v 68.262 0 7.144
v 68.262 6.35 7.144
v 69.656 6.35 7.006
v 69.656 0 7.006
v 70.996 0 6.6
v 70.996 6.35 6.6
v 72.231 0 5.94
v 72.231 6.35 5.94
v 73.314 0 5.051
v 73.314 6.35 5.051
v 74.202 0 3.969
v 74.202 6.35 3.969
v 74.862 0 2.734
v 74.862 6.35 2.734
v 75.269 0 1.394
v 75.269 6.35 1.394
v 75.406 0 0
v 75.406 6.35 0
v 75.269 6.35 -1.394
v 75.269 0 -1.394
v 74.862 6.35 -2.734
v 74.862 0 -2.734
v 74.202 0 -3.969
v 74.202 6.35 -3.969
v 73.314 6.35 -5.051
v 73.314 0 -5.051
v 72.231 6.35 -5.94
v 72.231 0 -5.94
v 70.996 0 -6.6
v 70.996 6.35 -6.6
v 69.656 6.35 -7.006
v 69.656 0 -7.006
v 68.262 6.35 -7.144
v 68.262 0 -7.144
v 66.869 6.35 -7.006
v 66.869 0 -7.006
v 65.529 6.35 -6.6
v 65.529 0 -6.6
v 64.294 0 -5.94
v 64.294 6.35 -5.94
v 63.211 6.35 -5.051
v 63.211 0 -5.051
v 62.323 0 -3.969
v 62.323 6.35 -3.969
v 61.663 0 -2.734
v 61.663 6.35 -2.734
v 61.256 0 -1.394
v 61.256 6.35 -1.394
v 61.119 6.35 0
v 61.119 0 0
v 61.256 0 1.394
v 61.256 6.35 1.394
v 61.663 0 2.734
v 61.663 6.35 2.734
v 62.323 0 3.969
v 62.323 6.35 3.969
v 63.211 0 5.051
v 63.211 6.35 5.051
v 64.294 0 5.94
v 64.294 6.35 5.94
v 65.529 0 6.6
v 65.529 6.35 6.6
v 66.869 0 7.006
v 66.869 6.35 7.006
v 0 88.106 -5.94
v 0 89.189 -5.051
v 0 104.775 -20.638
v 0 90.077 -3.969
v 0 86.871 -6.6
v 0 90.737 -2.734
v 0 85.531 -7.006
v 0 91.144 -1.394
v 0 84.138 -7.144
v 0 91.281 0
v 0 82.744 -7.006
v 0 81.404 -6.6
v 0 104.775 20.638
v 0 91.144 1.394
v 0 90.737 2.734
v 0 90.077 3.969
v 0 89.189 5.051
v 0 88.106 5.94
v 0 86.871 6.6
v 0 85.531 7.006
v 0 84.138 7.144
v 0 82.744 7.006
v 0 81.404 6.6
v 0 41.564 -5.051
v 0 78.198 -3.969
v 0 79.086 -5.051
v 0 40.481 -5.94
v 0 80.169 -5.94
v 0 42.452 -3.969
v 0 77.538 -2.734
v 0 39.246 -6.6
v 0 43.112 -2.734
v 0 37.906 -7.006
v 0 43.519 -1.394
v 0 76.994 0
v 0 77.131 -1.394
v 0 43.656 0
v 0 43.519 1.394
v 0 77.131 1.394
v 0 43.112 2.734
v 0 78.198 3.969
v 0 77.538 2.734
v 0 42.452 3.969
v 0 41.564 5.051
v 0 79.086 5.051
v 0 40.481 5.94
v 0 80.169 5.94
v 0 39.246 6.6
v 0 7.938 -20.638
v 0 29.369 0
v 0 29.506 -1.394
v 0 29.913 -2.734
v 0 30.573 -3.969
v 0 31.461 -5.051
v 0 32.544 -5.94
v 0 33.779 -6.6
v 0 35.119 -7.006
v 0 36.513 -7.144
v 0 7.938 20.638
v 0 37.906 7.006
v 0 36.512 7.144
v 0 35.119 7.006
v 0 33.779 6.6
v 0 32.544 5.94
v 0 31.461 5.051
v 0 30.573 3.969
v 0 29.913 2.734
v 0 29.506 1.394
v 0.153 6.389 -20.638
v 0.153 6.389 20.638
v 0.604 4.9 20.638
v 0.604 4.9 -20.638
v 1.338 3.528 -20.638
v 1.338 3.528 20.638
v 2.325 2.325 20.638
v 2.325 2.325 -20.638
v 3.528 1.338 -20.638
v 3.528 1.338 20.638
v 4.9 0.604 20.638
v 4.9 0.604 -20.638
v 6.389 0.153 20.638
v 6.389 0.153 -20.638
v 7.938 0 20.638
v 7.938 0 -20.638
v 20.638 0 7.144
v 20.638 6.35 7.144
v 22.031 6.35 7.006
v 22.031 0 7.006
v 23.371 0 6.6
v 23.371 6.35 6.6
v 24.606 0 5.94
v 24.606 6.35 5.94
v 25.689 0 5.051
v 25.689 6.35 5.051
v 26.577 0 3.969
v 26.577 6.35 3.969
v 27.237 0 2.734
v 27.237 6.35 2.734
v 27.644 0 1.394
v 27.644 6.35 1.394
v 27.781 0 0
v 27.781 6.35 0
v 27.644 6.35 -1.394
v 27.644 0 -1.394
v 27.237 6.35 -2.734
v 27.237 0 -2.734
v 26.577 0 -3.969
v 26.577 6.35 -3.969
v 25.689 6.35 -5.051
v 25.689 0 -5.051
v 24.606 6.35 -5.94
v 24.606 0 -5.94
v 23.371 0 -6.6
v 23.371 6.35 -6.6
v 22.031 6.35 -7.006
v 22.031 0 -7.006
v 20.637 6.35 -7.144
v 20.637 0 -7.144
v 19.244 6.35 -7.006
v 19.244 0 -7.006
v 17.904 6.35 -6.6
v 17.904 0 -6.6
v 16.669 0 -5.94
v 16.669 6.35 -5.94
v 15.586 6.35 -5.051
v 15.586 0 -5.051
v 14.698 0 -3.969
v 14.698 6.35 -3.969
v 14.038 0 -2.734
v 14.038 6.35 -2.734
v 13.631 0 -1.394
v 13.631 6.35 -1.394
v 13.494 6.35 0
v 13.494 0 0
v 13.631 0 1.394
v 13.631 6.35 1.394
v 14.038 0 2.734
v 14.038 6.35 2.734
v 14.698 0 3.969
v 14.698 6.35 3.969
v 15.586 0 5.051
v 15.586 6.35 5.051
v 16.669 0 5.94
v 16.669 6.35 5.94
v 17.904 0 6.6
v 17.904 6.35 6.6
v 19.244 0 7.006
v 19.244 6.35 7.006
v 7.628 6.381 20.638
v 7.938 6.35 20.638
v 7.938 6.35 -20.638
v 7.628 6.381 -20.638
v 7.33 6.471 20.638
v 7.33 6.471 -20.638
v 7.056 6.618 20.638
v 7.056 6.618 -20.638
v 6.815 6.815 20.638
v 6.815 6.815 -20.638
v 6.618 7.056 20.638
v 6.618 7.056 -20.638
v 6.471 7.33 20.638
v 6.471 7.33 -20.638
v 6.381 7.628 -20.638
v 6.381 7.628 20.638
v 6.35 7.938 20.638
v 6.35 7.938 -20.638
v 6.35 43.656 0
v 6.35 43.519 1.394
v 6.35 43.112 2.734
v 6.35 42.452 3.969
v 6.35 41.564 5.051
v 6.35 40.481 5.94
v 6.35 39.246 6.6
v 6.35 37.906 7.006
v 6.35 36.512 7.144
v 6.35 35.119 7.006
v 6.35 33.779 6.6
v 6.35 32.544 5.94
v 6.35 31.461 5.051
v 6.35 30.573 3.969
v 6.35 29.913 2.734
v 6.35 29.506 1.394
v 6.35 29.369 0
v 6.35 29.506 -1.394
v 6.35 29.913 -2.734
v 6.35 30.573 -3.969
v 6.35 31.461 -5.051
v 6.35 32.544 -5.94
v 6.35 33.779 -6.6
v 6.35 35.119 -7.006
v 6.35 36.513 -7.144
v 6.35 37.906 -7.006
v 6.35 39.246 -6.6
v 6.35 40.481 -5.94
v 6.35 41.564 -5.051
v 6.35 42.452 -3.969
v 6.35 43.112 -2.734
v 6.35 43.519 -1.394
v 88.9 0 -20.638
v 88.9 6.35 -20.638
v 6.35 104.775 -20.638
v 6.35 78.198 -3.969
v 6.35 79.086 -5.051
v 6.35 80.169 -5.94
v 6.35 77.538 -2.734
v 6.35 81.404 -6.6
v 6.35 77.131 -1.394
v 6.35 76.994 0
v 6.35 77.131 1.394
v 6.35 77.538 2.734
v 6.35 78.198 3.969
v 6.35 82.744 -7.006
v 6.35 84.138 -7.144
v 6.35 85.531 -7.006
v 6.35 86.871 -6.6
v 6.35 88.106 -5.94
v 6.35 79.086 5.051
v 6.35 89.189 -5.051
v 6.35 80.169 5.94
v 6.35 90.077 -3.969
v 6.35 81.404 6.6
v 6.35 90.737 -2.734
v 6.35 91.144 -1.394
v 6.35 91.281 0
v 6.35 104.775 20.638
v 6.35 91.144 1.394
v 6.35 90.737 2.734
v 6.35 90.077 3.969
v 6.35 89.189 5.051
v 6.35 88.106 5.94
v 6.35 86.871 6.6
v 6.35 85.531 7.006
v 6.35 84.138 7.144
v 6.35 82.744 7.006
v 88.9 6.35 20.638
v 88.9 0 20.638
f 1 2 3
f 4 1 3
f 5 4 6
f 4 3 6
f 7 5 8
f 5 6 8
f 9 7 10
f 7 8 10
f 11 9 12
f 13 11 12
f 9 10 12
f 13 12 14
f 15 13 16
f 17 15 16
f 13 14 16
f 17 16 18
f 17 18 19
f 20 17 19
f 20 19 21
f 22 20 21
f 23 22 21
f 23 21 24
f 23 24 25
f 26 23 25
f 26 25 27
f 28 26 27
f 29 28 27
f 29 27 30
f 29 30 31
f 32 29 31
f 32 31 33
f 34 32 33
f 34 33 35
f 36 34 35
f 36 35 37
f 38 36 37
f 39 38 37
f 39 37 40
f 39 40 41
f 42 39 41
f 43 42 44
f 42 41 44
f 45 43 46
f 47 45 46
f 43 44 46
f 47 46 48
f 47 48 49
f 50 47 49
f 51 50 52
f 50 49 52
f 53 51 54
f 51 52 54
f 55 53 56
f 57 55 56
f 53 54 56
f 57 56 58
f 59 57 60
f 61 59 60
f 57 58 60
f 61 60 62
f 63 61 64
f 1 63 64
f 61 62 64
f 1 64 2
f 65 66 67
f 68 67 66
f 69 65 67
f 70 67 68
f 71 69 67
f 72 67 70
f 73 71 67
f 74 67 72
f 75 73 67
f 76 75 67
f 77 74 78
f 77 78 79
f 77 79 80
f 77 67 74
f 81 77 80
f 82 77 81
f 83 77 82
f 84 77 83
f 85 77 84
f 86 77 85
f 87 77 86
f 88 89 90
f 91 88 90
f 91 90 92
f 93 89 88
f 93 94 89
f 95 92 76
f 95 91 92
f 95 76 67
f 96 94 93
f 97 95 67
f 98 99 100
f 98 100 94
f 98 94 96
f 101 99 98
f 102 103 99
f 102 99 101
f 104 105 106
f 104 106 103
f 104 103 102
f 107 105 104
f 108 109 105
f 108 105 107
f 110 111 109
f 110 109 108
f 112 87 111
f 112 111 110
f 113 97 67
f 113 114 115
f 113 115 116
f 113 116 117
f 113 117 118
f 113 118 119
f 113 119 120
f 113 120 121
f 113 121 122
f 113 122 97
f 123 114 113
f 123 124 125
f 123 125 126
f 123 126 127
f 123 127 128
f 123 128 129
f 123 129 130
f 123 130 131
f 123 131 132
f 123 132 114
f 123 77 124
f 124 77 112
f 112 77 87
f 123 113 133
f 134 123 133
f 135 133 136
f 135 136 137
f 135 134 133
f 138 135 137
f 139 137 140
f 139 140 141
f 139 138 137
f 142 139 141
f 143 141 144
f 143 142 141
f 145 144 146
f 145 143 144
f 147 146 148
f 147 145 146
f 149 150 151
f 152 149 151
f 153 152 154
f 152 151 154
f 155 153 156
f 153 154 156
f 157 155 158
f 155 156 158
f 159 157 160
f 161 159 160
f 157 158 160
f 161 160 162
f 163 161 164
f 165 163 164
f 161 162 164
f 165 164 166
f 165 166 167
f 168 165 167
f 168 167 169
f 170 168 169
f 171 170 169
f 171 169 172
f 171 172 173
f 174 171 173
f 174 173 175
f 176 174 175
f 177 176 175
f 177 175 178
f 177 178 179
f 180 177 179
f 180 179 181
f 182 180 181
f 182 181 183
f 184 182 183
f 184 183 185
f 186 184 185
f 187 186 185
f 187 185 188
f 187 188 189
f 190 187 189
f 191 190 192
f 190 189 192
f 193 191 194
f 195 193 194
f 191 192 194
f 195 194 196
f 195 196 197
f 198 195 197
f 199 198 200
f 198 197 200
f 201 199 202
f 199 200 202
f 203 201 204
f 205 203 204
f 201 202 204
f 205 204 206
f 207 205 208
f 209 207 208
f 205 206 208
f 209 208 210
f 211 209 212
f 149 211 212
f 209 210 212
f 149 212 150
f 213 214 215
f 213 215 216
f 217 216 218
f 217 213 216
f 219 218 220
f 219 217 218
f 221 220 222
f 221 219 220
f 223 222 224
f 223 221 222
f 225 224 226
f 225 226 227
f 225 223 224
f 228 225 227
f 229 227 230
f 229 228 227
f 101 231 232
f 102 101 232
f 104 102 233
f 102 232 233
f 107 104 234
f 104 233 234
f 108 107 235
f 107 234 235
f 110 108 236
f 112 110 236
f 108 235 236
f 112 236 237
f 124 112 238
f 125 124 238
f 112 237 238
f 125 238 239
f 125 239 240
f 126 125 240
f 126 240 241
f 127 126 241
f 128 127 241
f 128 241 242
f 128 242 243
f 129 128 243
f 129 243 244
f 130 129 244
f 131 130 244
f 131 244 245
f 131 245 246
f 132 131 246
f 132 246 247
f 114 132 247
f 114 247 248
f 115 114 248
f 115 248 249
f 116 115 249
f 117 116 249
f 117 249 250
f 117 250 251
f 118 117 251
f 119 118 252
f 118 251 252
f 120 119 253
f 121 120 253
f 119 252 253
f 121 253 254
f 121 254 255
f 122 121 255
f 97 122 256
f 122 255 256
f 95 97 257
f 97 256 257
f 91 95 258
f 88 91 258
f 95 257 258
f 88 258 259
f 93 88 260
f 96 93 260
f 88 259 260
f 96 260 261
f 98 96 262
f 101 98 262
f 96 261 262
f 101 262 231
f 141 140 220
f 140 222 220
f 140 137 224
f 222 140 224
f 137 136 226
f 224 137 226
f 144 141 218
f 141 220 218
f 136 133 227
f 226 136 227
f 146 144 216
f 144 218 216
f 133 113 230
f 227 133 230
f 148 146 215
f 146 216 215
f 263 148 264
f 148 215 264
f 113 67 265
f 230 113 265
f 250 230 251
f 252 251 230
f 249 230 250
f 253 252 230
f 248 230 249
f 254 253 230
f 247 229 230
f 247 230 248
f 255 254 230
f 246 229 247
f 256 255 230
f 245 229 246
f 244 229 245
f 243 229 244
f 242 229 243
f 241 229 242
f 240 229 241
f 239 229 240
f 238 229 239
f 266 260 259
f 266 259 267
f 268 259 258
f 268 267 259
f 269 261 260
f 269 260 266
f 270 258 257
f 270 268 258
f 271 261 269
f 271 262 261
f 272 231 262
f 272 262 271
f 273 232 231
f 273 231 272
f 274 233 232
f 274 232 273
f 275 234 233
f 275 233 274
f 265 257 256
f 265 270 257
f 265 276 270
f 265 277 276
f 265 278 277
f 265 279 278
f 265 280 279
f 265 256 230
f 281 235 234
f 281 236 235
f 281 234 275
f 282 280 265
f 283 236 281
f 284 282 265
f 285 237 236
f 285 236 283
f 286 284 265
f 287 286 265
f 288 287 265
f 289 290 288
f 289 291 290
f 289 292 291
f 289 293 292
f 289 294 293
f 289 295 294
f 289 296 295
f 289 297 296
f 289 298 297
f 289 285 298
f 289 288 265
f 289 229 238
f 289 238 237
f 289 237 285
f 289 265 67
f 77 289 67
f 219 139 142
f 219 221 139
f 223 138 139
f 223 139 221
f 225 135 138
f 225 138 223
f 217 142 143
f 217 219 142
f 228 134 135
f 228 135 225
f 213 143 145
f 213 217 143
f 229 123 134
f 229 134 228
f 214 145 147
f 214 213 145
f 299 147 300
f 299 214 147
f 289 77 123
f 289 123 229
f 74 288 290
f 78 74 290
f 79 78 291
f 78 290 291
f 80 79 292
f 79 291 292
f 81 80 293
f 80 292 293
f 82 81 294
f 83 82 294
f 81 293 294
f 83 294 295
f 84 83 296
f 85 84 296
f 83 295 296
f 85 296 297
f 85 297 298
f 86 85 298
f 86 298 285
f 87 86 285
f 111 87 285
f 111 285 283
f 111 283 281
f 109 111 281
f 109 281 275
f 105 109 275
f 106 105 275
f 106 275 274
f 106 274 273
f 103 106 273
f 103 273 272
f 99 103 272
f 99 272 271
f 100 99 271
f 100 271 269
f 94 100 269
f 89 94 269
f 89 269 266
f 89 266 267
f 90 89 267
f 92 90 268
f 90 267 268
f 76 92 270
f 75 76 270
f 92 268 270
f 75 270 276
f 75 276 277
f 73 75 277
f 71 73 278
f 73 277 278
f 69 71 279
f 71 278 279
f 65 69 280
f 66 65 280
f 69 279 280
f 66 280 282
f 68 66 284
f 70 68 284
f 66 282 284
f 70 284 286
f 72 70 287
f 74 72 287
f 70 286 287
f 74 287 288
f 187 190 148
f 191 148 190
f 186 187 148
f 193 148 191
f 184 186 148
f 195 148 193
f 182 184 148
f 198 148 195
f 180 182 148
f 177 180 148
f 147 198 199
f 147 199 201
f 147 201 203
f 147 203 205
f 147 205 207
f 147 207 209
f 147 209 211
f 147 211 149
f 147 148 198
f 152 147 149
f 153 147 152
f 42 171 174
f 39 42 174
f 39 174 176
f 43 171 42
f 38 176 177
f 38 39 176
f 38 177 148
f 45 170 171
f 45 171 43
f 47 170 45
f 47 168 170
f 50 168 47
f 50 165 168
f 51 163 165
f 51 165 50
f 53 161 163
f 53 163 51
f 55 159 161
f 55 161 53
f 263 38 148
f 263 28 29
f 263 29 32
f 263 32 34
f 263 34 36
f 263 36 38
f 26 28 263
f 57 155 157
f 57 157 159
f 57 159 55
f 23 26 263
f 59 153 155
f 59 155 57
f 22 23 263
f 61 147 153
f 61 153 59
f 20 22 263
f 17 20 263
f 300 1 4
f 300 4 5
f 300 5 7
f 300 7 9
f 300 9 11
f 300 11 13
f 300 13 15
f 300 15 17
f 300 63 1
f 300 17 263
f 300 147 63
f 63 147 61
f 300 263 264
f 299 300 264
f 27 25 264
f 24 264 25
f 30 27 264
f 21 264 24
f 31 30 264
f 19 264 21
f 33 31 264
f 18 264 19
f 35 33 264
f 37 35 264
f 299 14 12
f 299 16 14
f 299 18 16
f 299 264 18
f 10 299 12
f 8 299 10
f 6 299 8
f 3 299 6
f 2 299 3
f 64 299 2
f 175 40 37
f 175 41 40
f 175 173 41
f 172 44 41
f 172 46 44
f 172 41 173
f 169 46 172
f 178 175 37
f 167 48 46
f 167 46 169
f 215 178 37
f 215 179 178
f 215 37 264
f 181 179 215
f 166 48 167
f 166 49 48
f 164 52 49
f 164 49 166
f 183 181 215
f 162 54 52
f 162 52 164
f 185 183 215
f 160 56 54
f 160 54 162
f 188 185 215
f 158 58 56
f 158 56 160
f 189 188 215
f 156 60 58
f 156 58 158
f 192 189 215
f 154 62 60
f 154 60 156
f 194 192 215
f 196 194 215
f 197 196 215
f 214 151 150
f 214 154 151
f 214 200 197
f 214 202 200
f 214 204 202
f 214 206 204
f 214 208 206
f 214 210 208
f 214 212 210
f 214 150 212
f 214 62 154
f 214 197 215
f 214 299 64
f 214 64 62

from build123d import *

# Parameters (mm, degrees)
EXTRUDE_THIN1_DEPTH = 20.6375
SKETCH2_R           = 7.14375
CUT_EXTRUDE1_DEPTH  = 135.225917882
SKETCH3_R           = 7.14375
CUT_EXTRUDE2_DEPTH  = 135.974847773


with BuildPart() as part:
    # Sketch1 → Extrude-Thin1 (new, symmetric)
    with BuildSketch(Plane.XY):
        with BuildLine():
            Line((0, 104.775), (0, 7.9375))
            ThreePointArc((0, 7.9375), (2.324839924, 2.324839924), (7.9375, 0))
            Line((7.9375, 0), (88.9, 0))
            Line((88.9, 0), (88.9, 6.35))
            Line((88.9, 6.35), (7.9375, 6.35))
            ThreePointArc((7.9375, 6.35), (6.814967985, 6.814967985), (6.35, 7.9375))
            Line((6.35, 7.9375), (6.35, 104.775))
            Line((6.35, 104.775), (0, 104.775))
        make_face()
    extrude(amount=EXTRUDE_THIN1_DEPTH, both=True)

    # Sketch2 → Cut-Extrude1 (cut, through all)
    with BuildSketch(Plane(origin=(0, 6.35, 0), x_dir=(1, 0, 0), z_dir=(0, 1, 0))):
        with Locations(Location((68.2625, 0, 0), (0, 0, 270))):
            Circle(SKETCH2_R)
        with Locations(Location((20.6375, 0, 0), (0, 0, 270))):
            Circle(SKETCH2_R)
    extrude(amount=-CUT_EXTRUDE1_DEPTH, mode=Mode.SUBTRACT)

    # Sketch3 → Cut-Extrude2 (cut, through all)
    with BuildSketch(Plane(origin=(6.35, 0, 0), x_dir=(0, 0, -1), z_dir=(1, 0, 0))):
        with Locations(Location((0, 84.1375, 0), (0, 0, 90))):
            Circle(SKETCH3_R)
        with Locations(Location((0, 36.5125, 0), (0, 0, 90))):
            Circle(SKETCH3_R)
    extrude(amount=-CUT_EXTRUDE2_DEPTH, mode=Mode.SUBTRACT)


solid = part.part
